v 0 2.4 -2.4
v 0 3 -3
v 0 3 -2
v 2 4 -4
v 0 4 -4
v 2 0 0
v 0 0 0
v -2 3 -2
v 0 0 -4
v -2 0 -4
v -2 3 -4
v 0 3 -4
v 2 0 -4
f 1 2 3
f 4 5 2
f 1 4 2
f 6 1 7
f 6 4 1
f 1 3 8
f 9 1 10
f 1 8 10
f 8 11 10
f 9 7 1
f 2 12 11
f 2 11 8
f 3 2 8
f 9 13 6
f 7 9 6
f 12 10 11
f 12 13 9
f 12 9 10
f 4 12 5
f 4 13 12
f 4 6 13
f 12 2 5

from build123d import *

# Parameters (mm, degrees)
SKETCH1_W           = 4
SKETCH1_H           = 4
BOSS_EXTRUDE1_DEPTH = 2
SKETCH2_W           = 2
SKETCH2_H           = 3
BOSS_EXTRUDE2_DEPTH = 2
CUT_EXTRUDE1_DEPTH  = 2
CUT_EXTRUDE2_DEPTH  = 2


with BuildPart() as part:
    # Sketch1 → Boss-Extrude1 (new body)
    with BuildSketch(Plane(origin=(0, 0, 0), x_dir=(0, 0, -1), z_dir=(1, 0, 0))):
        with Locations((2, 2)):
            Rectangle(SKETCH1_W, SKETCH1_H)
    extrude(amount=BOSS_EXTRUDE1_DEPTH)

    # Sketch2 → Boss-Extrude2 (add)
    with BuildSketch(Plane.ZY):
        with Locations((-3, 1.5)):
            Rectangle(SKETCH2_W, SKETCH2_H)
    extrude(amount=BOSS_EXTRUDE2_DEPTH)

    # Sketch3 → Cut-Extrude1 (cut)
    with BuildSketch(Plane.ZY.offset(2)):
        Polygon((-2, 3), (-4, 0), (-2, 0), align=None)
    extrude(amount=-CUT_EXTRUDE1_DEPTH, mode=Mode.SUBTRACT)

    # Sketch4 → Cut-Extrude2 (cut)
    with BuildSketch(Plane(origin=(2, 0, 0), x_dir=(0, 0, -1), z_dir=(1, 0, 0))):
        Polygon((4, 4), (0, 0), (0, 4), align=None)
    extrude(amount=-CUT_EXTRUDE2_DEPTH, mode=Mode.SUBTRACT)


solid = part.part
